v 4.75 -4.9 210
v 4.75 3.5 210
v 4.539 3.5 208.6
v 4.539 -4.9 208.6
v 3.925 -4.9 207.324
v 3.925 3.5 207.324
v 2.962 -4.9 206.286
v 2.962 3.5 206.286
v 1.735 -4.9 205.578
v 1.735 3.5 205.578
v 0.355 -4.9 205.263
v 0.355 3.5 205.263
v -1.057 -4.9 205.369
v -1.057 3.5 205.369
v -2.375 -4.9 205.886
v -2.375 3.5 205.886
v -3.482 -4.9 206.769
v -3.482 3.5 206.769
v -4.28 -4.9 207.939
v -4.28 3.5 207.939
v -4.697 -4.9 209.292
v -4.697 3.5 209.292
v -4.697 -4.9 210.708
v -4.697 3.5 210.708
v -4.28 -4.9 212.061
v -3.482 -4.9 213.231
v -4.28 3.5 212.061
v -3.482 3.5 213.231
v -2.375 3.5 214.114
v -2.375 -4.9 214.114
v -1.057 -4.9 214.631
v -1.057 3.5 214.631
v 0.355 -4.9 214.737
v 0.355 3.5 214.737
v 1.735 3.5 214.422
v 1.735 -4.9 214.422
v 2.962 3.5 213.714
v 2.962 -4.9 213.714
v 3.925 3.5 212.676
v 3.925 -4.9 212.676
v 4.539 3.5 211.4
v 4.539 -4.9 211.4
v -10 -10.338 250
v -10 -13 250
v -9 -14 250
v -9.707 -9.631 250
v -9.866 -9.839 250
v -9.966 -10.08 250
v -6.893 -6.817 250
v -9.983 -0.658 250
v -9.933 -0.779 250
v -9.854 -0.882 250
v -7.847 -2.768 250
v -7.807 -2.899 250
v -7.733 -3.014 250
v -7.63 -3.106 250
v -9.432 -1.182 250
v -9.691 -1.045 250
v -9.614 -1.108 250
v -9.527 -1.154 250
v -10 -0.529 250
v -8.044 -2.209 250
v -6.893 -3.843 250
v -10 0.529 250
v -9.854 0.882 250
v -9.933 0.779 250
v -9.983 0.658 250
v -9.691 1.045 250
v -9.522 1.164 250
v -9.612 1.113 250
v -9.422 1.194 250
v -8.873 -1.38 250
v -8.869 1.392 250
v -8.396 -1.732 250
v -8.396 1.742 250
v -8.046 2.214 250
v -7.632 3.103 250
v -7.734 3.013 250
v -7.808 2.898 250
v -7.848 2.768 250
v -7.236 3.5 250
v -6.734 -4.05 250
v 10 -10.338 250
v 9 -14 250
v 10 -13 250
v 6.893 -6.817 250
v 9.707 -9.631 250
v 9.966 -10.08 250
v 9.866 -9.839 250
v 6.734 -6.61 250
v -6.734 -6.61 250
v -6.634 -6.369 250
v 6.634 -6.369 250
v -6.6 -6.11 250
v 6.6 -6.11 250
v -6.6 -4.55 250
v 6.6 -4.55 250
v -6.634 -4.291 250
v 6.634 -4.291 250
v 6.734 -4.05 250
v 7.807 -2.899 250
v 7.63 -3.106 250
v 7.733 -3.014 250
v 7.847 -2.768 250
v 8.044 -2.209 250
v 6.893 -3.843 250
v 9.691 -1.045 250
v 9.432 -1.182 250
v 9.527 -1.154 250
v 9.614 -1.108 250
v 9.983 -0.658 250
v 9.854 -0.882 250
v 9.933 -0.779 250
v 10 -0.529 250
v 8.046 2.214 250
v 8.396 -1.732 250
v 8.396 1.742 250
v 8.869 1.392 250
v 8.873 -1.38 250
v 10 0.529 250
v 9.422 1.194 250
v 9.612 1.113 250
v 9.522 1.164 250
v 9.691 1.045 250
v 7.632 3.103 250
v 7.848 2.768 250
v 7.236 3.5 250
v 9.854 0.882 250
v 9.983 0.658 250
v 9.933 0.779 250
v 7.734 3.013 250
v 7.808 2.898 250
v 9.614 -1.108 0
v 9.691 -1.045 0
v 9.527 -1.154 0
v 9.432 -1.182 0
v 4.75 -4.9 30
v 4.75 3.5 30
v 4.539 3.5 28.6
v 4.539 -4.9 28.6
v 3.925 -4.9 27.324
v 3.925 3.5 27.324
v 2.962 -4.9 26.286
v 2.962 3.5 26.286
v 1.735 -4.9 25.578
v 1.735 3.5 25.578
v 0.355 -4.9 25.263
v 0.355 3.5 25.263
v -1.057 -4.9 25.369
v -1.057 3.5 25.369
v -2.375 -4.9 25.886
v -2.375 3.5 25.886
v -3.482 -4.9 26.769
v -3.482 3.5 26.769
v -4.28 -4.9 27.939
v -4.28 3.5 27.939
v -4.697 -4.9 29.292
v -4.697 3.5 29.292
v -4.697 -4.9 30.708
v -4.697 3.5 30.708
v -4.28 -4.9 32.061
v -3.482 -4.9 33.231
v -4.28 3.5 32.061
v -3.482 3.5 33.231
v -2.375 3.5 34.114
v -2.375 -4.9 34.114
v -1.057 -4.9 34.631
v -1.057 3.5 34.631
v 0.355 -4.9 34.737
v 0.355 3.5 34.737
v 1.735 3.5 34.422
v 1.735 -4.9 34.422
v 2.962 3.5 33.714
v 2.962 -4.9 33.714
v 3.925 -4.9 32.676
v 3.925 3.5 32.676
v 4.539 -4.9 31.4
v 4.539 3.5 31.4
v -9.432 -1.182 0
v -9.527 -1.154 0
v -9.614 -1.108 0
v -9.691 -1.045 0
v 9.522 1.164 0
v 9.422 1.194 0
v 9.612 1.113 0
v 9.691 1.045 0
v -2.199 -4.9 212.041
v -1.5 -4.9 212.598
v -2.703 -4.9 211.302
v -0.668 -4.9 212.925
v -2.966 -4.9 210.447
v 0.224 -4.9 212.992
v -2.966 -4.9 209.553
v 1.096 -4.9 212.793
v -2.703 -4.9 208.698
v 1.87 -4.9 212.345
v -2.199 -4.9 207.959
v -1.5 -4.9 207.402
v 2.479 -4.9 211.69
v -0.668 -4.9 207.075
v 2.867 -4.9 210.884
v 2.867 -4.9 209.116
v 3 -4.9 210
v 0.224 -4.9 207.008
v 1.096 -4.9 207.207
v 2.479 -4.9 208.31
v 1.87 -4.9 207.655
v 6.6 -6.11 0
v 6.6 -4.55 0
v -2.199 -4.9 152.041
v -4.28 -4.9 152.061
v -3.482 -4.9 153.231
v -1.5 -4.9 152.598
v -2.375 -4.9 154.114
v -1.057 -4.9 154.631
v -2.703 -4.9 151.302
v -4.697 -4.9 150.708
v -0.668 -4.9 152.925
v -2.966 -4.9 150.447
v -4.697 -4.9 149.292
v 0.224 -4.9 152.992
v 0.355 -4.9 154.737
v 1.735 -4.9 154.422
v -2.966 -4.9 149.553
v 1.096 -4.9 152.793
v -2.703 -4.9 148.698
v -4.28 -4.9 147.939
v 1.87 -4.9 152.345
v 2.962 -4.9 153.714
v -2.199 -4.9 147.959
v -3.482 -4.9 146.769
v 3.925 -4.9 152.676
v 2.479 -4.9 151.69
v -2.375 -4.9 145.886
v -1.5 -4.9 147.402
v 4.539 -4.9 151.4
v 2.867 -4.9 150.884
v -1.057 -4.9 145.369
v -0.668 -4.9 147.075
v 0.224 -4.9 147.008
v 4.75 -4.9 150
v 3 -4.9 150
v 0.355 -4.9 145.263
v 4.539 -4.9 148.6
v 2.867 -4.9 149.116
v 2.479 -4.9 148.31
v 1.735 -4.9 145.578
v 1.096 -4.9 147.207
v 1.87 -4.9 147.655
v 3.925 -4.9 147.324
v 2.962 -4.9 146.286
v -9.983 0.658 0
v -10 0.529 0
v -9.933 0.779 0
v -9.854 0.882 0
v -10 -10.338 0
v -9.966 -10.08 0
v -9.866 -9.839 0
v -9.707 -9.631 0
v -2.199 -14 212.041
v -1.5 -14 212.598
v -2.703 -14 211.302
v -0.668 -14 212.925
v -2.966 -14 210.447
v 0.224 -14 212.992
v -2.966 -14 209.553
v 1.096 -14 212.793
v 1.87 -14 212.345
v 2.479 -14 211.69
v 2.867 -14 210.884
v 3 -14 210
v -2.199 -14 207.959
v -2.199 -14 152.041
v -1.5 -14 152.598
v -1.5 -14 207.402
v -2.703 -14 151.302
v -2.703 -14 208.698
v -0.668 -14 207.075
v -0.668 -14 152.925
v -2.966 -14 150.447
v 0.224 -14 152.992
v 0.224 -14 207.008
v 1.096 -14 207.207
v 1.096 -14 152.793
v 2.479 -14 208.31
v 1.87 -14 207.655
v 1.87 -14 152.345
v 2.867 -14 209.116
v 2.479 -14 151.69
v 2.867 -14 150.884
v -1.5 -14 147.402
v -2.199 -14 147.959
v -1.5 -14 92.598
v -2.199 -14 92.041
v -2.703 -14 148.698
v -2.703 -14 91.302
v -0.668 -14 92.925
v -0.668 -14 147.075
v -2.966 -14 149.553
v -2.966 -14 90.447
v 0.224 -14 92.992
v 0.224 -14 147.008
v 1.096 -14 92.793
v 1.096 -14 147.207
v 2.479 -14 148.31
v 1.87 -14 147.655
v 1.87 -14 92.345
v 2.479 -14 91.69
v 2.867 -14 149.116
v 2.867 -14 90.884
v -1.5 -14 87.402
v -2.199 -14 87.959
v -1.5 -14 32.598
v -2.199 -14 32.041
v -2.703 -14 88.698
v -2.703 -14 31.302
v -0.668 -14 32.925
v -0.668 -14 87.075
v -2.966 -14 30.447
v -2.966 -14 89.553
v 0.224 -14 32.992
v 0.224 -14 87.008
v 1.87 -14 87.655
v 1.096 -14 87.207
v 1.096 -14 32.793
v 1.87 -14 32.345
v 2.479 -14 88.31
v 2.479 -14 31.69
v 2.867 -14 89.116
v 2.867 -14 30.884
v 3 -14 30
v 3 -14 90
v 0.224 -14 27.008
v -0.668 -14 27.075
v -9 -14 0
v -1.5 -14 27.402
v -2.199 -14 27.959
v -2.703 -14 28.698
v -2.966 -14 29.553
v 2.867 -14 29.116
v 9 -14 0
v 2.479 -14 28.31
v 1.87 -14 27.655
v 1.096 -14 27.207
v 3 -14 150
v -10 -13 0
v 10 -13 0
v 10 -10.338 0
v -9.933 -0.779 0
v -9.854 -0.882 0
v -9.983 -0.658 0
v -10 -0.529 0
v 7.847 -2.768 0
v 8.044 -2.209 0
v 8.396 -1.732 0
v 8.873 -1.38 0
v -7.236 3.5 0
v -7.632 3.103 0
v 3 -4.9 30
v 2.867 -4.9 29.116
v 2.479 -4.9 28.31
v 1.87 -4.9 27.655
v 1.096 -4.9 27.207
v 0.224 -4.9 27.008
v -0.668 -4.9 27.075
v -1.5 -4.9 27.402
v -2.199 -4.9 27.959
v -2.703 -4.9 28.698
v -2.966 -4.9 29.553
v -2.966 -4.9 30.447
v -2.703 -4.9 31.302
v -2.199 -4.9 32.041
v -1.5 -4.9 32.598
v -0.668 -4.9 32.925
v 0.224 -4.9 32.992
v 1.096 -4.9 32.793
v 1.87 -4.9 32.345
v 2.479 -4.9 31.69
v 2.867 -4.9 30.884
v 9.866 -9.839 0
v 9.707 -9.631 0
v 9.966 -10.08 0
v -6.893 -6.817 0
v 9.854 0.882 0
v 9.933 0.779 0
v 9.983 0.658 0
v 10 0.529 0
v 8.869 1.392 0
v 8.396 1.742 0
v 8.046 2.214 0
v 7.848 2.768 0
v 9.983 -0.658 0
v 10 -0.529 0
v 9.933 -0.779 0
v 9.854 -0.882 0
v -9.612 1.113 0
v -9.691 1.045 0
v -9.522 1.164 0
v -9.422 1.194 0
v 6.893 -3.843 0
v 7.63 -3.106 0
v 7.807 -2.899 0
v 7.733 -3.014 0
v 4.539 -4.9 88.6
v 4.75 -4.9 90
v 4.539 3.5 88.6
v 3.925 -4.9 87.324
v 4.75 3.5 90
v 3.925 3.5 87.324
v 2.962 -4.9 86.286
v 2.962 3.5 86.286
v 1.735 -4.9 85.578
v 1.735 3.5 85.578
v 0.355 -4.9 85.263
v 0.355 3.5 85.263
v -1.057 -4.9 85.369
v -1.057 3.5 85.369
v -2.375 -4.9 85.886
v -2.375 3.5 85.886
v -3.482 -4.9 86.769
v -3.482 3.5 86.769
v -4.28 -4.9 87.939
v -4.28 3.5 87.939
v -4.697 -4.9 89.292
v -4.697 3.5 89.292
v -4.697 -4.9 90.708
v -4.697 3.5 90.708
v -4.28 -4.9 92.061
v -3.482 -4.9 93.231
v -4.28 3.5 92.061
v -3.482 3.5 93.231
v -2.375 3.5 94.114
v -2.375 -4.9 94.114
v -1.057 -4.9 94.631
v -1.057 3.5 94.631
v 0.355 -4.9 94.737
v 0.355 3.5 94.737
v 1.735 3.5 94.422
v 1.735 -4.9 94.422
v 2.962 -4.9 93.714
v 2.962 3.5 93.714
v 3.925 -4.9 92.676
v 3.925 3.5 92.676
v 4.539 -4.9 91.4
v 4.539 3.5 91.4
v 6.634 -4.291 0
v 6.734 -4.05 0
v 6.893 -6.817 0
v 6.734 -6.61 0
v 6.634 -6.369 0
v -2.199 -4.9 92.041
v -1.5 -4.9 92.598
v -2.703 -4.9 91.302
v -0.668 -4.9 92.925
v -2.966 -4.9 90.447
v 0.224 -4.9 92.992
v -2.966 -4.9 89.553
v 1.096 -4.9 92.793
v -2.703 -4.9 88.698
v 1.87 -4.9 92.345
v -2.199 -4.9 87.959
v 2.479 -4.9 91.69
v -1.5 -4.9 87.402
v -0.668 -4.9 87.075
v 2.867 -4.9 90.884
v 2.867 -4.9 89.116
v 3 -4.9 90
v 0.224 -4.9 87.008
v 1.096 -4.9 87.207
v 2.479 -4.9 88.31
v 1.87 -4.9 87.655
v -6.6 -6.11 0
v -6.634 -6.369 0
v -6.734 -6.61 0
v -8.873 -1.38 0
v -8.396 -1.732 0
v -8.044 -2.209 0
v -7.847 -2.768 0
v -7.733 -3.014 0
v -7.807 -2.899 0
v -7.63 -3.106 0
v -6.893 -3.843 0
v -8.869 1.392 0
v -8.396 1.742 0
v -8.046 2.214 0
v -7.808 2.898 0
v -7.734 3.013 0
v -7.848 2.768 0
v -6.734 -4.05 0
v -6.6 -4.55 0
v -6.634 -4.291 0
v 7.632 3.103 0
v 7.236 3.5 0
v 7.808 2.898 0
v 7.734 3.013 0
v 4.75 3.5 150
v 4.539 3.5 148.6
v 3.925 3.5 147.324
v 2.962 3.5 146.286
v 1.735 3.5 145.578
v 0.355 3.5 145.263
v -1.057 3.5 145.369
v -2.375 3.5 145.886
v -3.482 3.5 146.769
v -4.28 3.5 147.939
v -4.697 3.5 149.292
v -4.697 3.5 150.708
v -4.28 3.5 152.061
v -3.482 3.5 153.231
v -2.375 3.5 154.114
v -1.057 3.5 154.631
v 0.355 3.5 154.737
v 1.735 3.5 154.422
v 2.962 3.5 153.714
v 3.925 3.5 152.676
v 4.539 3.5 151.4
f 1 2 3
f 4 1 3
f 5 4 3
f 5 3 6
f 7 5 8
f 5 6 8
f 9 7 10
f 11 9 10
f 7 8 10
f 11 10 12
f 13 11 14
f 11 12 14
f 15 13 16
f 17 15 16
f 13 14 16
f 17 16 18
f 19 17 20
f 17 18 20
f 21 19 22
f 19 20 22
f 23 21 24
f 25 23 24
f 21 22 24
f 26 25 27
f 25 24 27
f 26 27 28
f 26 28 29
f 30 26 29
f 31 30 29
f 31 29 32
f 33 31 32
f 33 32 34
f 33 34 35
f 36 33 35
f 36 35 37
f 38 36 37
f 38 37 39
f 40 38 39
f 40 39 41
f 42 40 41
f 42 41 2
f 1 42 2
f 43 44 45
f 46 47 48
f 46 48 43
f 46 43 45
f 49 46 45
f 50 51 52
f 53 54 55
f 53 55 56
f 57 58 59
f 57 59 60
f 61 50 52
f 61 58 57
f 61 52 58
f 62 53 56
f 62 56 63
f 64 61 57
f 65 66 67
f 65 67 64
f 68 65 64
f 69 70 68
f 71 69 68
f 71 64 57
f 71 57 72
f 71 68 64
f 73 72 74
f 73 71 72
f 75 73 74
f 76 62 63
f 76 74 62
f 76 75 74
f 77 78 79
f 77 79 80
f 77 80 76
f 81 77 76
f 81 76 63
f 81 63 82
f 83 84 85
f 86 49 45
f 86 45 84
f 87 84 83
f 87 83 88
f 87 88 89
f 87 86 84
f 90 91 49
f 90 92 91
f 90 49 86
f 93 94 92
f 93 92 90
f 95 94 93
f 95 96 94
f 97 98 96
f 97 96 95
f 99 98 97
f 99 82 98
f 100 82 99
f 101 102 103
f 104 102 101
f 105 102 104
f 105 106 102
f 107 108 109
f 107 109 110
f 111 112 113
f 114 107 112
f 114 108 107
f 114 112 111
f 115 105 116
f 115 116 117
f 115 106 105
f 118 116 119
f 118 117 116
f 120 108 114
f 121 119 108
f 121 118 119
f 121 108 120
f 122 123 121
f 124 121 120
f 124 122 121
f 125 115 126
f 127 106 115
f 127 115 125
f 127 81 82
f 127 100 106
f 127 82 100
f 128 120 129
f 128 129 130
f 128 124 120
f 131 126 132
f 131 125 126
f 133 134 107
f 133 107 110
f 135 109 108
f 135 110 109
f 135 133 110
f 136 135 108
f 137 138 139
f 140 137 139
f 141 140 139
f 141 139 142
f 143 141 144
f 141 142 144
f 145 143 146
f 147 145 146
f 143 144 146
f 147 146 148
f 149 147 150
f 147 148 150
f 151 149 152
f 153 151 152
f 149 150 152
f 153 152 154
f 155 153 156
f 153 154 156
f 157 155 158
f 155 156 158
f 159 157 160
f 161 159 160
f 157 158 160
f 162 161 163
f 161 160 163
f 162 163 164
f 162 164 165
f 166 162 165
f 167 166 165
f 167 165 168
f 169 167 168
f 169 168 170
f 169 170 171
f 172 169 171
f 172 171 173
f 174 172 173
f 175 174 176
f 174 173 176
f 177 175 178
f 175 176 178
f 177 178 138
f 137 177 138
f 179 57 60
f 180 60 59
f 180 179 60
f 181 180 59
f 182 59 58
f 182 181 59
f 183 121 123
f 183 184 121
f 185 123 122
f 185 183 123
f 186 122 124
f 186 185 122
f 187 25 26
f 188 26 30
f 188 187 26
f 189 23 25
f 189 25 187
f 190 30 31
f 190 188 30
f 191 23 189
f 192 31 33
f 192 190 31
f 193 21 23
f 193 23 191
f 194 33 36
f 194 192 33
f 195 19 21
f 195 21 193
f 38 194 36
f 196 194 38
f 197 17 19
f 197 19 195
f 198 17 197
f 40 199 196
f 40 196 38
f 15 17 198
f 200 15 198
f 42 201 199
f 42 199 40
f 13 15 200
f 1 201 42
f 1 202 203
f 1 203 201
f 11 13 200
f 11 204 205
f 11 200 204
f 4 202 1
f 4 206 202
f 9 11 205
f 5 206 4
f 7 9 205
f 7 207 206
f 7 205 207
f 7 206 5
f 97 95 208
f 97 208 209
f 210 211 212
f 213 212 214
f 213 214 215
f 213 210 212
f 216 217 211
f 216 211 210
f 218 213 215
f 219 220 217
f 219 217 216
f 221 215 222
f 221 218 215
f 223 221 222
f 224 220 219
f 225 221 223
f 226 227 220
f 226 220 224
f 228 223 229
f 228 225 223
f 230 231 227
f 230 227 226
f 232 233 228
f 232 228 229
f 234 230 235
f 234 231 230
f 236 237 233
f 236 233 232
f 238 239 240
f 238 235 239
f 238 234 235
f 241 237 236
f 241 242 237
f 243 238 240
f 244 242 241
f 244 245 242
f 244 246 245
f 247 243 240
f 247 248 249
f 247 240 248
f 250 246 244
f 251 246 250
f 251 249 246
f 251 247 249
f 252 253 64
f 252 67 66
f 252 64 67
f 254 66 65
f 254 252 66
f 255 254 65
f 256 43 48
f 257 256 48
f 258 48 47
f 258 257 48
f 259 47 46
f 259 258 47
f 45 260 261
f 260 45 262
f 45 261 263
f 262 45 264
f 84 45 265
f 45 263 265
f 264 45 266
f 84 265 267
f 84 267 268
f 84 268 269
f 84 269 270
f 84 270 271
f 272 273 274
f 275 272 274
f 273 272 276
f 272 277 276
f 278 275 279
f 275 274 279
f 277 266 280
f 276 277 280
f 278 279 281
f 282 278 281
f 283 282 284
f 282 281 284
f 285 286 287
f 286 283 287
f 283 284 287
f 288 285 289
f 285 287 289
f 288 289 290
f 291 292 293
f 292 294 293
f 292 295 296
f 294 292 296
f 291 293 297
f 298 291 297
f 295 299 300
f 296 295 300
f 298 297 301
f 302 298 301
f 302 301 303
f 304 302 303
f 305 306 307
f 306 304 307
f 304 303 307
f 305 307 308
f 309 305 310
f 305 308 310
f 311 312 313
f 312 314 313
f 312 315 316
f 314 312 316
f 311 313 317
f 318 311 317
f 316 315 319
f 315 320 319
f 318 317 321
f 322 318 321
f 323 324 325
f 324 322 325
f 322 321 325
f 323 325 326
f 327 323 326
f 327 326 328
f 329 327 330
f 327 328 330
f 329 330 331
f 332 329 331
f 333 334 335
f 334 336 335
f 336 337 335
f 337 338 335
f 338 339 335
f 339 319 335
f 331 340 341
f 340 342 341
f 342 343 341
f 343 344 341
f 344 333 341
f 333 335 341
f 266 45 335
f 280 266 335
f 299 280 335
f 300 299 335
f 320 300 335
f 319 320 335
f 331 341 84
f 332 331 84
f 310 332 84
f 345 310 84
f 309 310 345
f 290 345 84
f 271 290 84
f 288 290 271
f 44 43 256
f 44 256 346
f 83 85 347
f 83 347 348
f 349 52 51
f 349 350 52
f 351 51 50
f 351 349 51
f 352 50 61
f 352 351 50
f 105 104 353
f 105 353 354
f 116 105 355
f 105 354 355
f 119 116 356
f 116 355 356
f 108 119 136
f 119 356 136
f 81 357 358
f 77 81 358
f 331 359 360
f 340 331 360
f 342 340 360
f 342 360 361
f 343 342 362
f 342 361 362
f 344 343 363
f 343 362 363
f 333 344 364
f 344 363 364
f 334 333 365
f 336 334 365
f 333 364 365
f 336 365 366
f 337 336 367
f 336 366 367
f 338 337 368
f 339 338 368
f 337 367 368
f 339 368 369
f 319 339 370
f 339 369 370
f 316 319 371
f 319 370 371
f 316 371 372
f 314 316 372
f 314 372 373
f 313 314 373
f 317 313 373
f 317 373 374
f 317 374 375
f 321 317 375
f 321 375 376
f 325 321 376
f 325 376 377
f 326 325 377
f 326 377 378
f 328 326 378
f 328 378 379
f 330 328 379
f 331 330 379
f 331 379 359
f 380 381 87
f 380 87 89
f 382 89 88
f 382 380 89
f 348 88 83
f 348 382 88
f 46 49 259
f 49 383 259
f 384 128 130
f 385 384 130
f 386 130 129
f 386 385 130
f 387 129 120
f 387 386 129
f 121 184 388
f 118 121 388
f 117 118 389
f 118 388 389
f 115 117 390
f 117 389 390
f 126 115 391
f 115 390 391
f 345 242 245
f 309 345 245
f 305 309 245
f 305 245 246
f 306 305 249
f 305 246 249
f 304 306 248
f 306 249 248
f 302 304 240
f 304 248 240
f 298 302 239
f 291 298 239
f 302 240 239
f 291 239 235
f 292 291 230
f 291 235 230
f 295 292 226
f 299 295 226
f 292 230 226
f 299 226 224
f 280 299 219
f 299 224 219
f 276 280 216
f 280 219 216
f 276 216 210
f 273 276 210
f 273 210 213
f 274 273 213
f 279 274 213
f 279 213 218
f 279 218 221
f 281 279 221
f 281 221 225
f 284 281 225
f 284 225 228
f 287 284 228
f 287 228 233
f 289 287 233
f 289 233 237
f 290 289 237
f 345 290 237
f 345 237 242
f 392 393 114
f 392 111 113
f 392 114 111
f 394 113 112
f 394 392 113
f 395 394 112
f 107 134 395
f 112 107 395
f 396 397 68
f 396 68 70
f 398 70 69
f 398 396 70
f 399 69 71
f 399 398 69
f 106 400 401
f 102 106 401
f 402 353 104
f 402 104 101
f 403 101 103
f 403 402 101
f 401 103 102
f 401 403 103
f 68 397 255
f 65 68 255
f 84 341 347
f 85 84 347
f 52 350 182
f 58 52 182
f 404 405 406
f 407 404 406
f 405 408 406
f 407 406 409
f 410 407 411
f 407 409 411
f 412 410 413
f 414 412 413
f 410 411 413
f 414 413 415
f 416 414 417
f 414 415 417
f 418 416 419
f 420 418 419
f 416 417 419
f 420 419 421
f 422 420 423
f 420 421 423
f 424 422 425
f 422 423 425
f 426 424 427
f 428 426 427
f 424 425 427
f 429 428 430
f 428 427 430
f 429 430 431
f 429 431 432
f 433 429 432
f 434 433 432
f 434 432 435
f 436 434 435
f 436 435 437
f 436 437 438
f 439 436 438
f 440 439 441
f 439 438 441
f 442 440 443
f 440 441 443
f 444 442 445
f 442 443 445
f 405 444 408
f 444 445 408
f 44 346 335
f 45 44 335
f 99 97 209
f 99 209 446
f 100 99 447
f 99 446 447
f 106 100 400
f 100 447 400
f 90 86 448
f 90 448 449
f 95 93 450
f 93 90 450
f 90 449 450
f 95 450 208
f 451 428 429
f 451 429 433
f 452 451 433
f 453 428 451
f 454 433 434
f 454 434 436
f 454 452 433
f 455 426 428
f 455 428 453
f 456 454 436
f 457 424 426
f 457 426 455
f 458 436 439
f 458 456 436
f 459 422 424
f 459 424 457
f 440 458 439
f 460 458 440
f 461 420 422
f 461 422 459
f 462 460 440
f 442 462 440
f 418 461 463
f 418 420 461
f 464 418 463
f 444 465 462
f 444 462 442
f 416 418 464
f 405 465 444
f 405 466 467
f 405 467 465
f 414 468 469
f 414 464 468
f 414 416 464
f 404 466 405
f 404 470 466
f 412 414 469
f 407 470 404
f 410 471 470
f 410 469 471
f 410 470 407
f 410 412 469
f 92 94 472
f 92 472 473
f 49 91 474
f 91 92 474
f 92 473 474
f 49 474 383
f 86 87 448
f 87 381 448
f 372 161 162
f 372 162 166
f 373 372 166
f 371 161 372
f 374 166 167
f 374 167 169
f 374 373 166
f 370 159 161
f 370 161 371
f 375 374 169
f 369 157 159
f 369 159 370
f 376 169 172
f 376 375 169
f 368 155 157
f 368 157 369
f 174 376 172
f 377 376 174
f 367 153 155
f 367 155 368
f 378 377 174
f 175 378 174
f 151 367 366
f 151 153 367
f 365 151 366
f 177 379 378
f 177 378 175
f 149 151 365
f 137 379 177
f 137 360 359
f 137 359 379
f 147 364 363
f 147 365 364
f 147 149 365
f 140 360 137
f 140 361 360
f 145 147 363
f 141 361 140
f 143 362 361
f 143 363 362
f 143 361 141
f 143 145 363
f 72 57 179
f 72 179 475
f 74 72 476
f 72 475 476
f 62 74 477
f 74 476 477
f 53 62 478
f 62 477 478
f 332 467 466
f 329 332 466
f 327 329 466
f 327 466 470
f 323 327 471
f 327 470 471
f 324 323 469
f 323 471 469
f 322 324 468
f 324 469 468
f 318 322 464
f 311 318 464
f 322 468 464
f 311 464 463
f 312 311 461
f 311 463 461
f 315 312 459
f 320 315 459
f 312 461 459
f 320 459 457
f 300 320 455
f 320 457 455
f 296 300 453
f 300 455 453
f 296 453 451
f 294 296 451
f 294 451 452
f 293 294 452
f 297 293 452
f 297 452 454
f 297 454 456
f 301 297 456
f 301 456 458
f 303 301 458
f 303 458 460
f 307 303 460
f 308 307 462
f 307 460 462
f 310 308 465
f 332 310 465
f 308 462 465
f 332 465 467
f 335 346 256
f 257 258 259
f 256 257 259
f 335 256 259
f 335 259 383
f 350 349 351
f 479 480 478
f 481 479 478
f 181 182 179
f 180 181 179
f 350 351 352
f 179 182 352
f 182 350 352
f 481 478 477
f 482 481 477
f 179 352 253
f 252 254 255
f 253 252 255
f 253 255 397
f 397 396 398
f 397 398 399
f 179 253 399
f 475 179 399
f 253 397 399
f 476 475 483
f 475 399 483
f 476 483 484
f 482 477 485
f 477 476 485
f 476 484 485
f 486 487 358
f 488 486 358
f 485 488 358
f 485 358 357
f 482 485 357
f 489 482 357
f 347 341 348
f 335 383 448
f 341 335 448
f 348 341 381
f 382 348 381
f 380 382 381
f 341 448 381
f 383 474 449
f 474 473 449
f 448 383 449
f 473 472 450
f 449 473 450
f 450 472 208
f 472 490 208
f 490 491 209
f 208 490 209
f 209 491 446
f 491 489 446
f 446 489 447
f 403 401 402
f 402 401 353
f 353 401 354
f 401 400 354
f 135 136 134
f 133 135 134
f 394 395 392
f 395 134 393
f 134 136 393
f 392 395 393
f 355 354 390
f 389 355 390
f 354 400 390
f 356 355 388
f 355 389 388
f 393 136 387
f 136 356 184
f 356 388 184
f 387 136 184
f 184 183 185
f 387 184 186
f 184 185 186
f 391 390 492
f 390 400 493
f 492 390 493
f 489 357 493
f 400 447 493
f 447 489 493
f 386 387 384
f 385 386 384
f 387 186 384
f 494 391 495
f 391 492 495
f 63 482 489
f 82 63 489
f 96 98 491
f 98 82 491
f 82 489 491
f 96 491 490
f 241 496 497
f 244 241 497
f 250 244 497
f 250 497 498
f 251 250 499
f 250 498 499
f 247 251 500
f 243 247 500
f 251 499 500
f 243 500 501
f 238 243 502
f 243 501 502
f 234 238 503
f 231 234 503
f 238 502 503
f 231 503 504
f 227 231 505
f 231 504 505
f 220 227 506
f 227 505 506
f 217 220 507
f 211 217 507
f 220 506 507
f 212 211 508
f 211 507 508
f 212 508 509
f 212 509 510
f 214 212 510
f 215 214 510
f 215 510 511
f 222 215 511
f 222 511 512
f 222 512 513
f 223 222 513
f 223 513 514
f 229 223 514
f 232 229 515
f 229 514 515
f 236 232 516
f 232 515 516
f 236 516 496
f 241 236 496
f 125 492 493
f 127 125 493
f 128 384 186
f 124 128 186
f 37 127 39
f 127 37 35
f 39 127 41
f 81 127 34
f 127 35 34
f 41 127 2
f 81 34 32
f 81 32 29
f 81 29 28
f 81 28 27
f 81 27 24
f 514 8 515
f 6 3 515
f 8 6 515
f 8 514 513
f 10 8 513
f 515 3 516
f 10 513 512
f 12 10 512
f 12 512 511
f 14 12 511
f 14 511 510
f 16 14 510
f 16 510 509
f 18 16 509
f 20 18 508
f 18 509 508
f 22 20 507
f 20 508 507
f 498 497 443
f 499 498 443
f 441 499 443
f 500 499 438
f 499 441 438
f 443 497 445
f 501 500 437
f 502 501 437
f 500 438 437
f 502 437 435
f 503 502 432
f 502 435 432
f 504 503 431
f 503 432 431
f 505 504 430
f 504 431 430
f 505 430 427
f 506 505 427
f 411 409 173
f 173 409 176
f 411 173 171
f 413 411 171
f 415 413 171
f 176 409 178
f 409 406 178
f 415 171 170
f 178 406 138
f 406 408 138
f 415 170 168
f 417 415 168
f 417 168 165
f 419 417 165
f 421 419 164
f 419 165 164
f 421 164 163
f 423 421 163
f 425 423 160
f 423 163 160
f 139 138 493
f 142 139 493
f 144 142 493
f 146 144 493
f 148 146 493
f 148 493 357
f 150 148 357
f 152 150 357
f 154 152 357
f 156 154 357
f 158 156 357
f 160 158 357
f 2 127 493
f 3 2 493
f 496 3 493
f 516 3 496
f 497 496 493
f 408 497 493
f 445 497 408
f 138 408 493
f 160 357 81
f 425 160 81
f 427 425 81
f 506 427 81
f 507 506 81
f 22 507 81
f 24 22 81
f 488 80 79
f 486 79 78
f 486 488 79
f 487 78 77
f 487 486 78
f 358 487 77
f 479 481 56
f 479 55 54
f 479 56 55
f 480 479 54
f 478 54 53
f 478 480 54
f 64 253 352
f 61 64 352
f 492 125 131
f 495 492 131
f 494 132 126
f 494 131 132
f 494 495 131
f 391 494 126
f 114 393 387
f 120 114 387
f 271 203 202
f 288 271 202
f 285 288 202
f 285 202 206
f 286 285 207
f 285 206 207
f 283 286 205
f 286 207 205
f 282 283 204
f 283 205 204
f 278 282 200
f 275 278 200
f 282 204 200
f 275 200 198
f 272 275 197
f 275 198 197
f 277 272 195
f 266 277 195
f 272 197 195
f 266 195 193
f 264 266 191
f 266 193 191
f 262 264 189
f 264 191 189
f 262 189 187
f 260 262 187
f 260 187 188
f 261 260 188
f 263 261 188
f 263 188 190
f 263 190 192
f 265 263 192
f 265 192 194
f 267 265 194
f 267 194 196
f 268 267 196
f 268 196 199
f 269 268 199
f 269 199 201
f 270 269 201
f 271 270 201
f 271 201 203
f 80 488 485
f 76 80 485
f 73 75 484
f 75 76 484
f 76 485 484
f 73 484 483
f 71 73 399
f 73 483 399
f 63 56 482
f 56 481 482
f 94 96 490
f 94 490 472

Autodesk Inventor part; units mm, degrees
ref_plane "YZ Plane" through (0, 0, 0) normal (1, 0, 0) x (0, 1, 0)
ref_plane "XZ Plane" through (0, 0, 0) normal (0, 1, 0) x (-1, 0, 0)
ref_plane "XY Plane" through (0, 0, 0) normal (0, 0, 1) x (1, 0, 0)
sketch "Sketch1" plane through (0, 0, 0) normal (0, 0, 1) x (1, 0, 0)
  arc A0 (-9.7071, -9.6314) -> (-10, -10.3385) centre (-9, -10.3385) ccw
  line L0 (-10, -10.3385) -> (-10, -13)
  line L1 (-10, -13) -> (-9, -14)
  line L2 (-9, -14) -> (9, -14)
  line L3 (9, -14) -> (10, -13)
  line L4 (10, -13) -> (10, -10.3385)
  arc A1 (10, -10.3385) -> (9.7071, -9.6314) centre (9, -10.3385) ccw
  line L5 (9.7071, -9.6314) -> (6.8929, -6.8172)
  arc A2 (6.6, -6.1101) -> (6.8929, -6.8172) centre (7.6, -6.1101) ccw
  line L6 (6.6, -6.1101) -> (6.6, -4.5499)
  arc A3 (6.8929, -3.8428) -> (6.6, -4.5499) centre (7.6, -4.5499) ccw
  line L7 (6.8929, -3.8428) -> (7.6302, -3.1056)
  arc A4 (7.6302, -3.1056) -> (7.8468, -2.7675) centre (7.3529, -2.6895) ccw
  arc A5 (9.4318, -1.1825) -> (7.8468, -2.7675) centre (9.8106, -3.1463) ccw
  arc A6 (9.4318, -1.1825) -> (9.6906, -1.0451) centre (9.3371, -0.6915) ccw
  line L8 (9.6906, -1.0451) -> (9.8536, -0.8822)
  arc A7 (9.8536, -0.8822) -> (10, -0.5286) centre (9.5, -0.5286) ccw
  line L9 (10, -0.5286) -> (10, 0.5286)
  arc A8 (10, 0.5286) -> (9.8536, 0.8822) centre (9.5, 0.5286) ccw
  line L10 (9.8536, 0.8822) -> (9.6906, 1.0451)
  arc A9 (9.6906, 1.0451) -> (9.4224, 1.1941) centre (9.3254, 0.7036) ccw
  arc A10 (7.8482, 2.768) -> (9.4224, 1.1941) centre (9.8101, 3.1561) ccw
  arc A11 (7.8482, 2.768) -> (7.6325, 3.1032) centre (7.3547, 2.6875) ccw
  line L11 (7.6325, 3.1032) -> (7.2357, 3.5)
  line L12 (7.2357, 3.5) -> (-7.2357, 3.5)
  line L13 (-7.2357, 3.5) -> (-7.6325, 3.1032)
  arc A12 (-7.6325, 3.1032) -> (-7.8482, 2.768) centre (-7.3547, 2.6875) ccw
  arc A13 (-9.4224, 1.1941) -> (-7.8482, 2.768) centre (-9.8101, 3.1561) ccw
  arc A14 (-9.4224, 1.1941) -> (-9.6906, 1.0451) centre (-9.3254, 0.7036) ccw
  line L14 (-9.6906, 1.0451) -> (-9.8536, 0.8822)
  arc A15 (-9.8536, 0.8822) -> (-10, 0.5286) centre (-9.5, 0.5286) ccw
  line L15 (-10, 0.5286) -> (-10, -0.5286)
  arc A16 (-10, -0.5286) -> (-9.8536, -0.8822) centre (-9.5, -0.5286) ccw
  line L16 (-9.8536, -0.8822) -> (-9.6906, -1.0451)
  arc A17 (-9.6906, -1.0451) -> (-9.4318, -1.1825) centre (-9.3371, -0.6915) ccw
  arc A18 (-7.8468, -2.7675) -> (-9.4318, -1.1825) centre (-9.8106, -3.1463) ccw
  arc A19 (-7.8468, -2.7675) -> (-7.6302, -3.1056) centre (-7.3529, -2.6895) ccw
  line L17 (-7.6302, -3.1056) -> (-6.8929, -3.8428)
  arc A20 (-6.6, -4.5499) -> (-6.8929, -3.8428) centre (-7.6, -4.5499) ccw
  line L18 (-6.6, -4.5499) -> (-6.6, -6.1101)
  arc A21 (-6.8929, -6.8172) -> (-6.6, -6.1101) centre (-7.6, -6.1101) ccw
  line L19 (-6.8929, -6.8172) -> (-9.7071, -9.6314)
  point P0 (0, 0)
  point P1 (0, 0)
  dimension "d82" = 18
  dimension "d83" = 14.4714
extrude "Extrusion1" add sketch "Sketch1" along normal blind 250
sketch "Sketch2" plane through (-7.2357, 3.5, 250) normal (0, 1, 0) x (1, 0, 0)
  line L0 (14.4714, 250) -> (0, 250) projected
  line L1 (0, 250) -> (0, 0) projected
  line L2 (14.4714, 0) -> (0, 0) projected
  line L3 (14.4714, 250) -> (14.4714, 0) projected
  circle A0 centre (7.2357, 1480) radius 4.75
  circle A1 centre (7.2357, 1480) radius 3
  circle A2 centre (7.2357, 1420) radius 4.75
  circle A3 centre (7.2357, 1420) radius 3
  circle A4 centre (7.2357, 1360) radius 4.75
  circle A5 centre (7.2357, 1360) radius 3
  circle A6 centre (7.2357, 1300) radius 4.75
  circle A7 centre (7.2357, 1300) radius 3
  circle A8 centre (7.2357, 1240) radius 4.75
  circle A9 centre (7.2357, 1240) radius 3
  circle A10 centre (7.2357, 1180) radius 4.75
  circle A11 centre (7.2357, 1180) radius 3
  circle A12 centre (7.2357, 1120) radius 4.75
  circle A13 centre (7.2357, 1120) radius 3
  circle A14 centre (7.2357, 1060) radius 4.75
  circle A15 centre (7.2357, 1060) radius 3
  circle A16 centre (7.2357, 1000) radius 4.75
  circle A17 centre (7.2357, 1000) radius 3
  circle A18 centre (7.2357, 940) radius 4.75
  circle A19 centre (7.2357, 940) radius 3
  circle A20 centre (7.2357, 880) radius 4.75
  circle A21 centre (7.2357, 880) radius 3
  circle A22 centre (7.2357, 820) radius 4.75
  circle A23 centre (7.2357, 820) radius 3
  circle A24 centre (7.2357, 760) radius 4.75
  circle A25 centre (7.2357, 760) radius 3
  circle A26 centre (7.2357, 700) radius 4.75
  circle A27 centre (7.2357, 700) radius 3
  circle A28 centre (7.2357, 640) radius 4.75
  circle A29 centre (7.2357, 640) radius 3
  circle A30 centre (7.2357, 580) radius 4.75
  circle A31 centre (7.2357, 580) radius 3
  circle A32 centre (7.2357, 520) radius 4.75
  circle A33 centre (7.2357, 520) radius 3
  circle A34 centre (7.2357, 460) radius 4.75
  circle A35 centre (7.2357, 460) radius 3
  circle A36 centre (7.2357, 400) radius 4.75
  circle A37 centre (7.2357, 400) radius 3
  circle A38 centre (7.2357, 340) radius 4.75
  circle A39 centre (7.2357, 340) radius 3
  circle A40 centre (7.2357, 280) radius 4.75
  circle A41 centre (7.2357, 280) radius 3
  circle A42 centre (7.2357, 220) radius 4.75
  circle A43 centre (7.2357, 220) radius 3
  circle A44 centre (7.2357, 160) radius 4.75
  circle A45 centre (7.2357, 160) radius 3
  circle A46 centre (7.2357, 100) radius 4.75
  circle A47 centre (7.2357, 100) radius 3
  circle A48 centre (7.2357, 40) radius 4.75
  circle A49 centre (7.2357, 40) radius 3
  point P0 (7.2357, 250)
  dimension "d3" = 9.5
  dimension "d4" = 6
  dimension "d6" = 9.5
  dimension "d7" = 6
  dimension "d9" = 9.5
  dimension "d10" = 6
  dimension "d12" = 9.5
  dimension "d13" = 6
  dimension "d15" = 9.5
  dimension "d16" = 6
  dimension "d18" = 9.5
  dimension "d19" = 6
  dimension "d21" = 9.5
  dimension "d22" = 6
  dimension "d24" = 9.5
  dimension "d25" = 6
  dimension "d27" = 9.5
  dimension "d28" = 6
  dimension "d30" = 9.5
  dimension "d31" = 6
  dimension "d33" = 9.5
  dimension "d34" = 6
  dimension "d36" = 9.5
  dimension "d37" = 6
  dimension "d39" = 9.5
  dimension "d40" = 6
  dimension "d42" = 9.5
  dimension "d43" = 6
  dimension "d45" = 9.5
  dimension "d46" = 6
  dimension "d48" = 9.5
  dimension "d49" = 6
  dimension "d51" = 9.5
  dimension "d52" = 6
  dimension "d54" = 9.5
  dimension "d55" = 6
  dimension "d57" = 9.5
  dimension "d58" = 6
  dimension "d60" = 9.5
  dimension "d61" = 6
  dimension "d63" = 9.5
  dimension "d64" = 6
  dimension "d66" = 9.5
  dimension "d67" = 6
  dimension "d69" = 9.5
  dimension "d70" = 6
  dimension "d72" = 9.5
  dimension "d73" = 6
  dimension "d75" = 9.5
  dimension "d76" = 6
extrude "Extrusion2" cut sketch "Sketch2" against normal blind 30 contours A1 | A3 | A5 | A7 | A9 | A11 | A13 | A15 | A17 | A19 | A21 | A23 | A25 | A27 | A29 | A31 | A35 | A37 | A39 | A41 | A43 | A45 | A47 | A49
extrude "Extrusion3" cut sketch "Sketch2" against normal blind 8.4 contours A0 | A2 | A4 | A6 | A8 | A10 | A11 | A12 | A14 | A16 | A18 | A20 | A24 | A26 | A28 | A30 | A32 | A34 | A36 | A38 | A40 | A42 | A44 | A46 | A48
sketch "Sketch3" plane through (0, 0, 250) normal (0, 0, 1) x (1, 0, 0)
  line L0 (9.6906, -1.0451) -> (9.8536, -0.8822) projected
  arc A0 (9.8536, -0.8822) -> (10, -0.5286) centre (9.5, -0.5286) ccw projected
  line L1 (10, -0.5286) -> (10, 0.5286) projected
  arc A1 (10, 0.5286) -> (9.8536, 0.8822) centre (9.5, 0.5286) ccw projected
  line L2 (9.8536, 0.8822) -> (9.6906, 1.0451) projected
  arc A2 (9.6906, 1.0451) -> (9.4224, 1.1941) centre (9.3254, 0.7036) ccw projected
  arc A3 (7.8482, 2.768) -> (9.4224, 1.1941) centre (9.8101, 3.1561) ccw projected
  arc A4 (7.8482, 2.768) -> (7.6325, 3.1032) centre (7.3547, 2.6875) ccw projected
  line L3 (7.6325, 3.1032) -> (7.2357, 3.5) projected
  line L4 (7.2357, 3.5) -> (-7.2357, 3.5) projected
  line L5 (-7.2357, 3.5) -> (-7.6325, 3.1032) projected
  arc A5 (-7.6325, 3.1032) -> (-7.8482, 2.768) centre (-7.3547, 2.6875) ccw projected
  arc A6 (-9.4224, 1.1941) -> (-7.8482, 2.768) centre (-9.8101, 3.1561) ccw projected
  arc A7 (-9.4224, 1.1941) -> (-9.6906, 1.0451) centre (-9.3254, 0.7036) ccw projected
  line L6 (-9.6906, 1.0451) -> (-9.8536, 0.8822) projected
  arc A8 (-9.8536, 0.8822) -> (-10, 0.5286) centre (-9.5, 0.5286) ccw projected
  line L7 (-10, 0.5286) -> (-10, -0.5286) projected
  arc A9 (-10, -0.5286) -> (-9.8536, -0.8822) centre (-9.5, -0.5286) ccw projected
  line L8 (-9.8536, -0.8822) -> (-9.6906, -1.0451) projected
  arc A10 (-9.6906, -1.0451) -> (-9.4318, -1.1825) centre (-9.3371, -0.6915) ccw projected
  arc A11 (-7.8468, -2.7675) -> (-9.4318, -1.1825) centre (-9.8106, -3.1463) ccw projected
  arc A12 (-7.8468, -2.7675) -> (-7.6302, -3.1056) centre (-7.3529, -2.6895) ccw projected
  line L9 (-7.6302, -3.1056) -> (-6.8929, -3.8428) projected
  arc A13 (-6.6, -4.5499) -> (-6.8929, -3.8428) centre (-7.6, -4.5499) ccw projected
  line L10 (-6.6, -4.5499) -> (-6.6, -6.1101) projected
  arc A14 (-6.8929, -6.8172) -> (-6.6, -6.1101) centre (-7.6, -6.1101) ccw projected
  line L11 (-6.8929, -6.8172) -> (-9.7071, -9.6314) projected
  arc A15 (-9.7071, -9.6314) -> (-10, -10.3385) centre (-9, -10.3385) ccw projected
  line L12 (-10, -10.3385) -> (-10, -13) projected
  line L13 (-10, -13) -> (-9, -14) projected
  line L14 (-9, -14) -> (9, -14) projected
  line L15 (9, -14) -> (10, -13) projected
  line L16 (10, -13) -> (10, -10.3385) projected
  arc A16 (10, -10.3385) -> (9.7071, -9.6314) centre (9, -10.3385) ccw projected
  line L17 (9.7071, -9.6314) -> (6.8929, -6.8172) projected
  arc A17 (6.6, -6.1101) -> (6.8929, -6.8172) centre (7.6, -6.1101) ccw projected
  line L18 (6.6, -6.1101) -> (6.6, -4.5499) projected
  arc A18 (6.8929, -3.8428) -> (6.6, -4.5499) centre (7.6, -4.5499) ccw projected
  line L19 (6.8929, -3.8428) -> (7.6302, -3.1056) projected
  arc A19 (7.6302, -3.1056) -> (7.8468, -2.7675) centre (7.3529, -2.6895) ccw projected
  arc A20 (9.4318, -1.1825) -> (7.8468, -2.7675) centre (9.8106, -3.1463) ccw projected
  arc A21 (9.4318, -1.1825) -> (9.6906, -1.0451) centre (9.3371, -0.6915) ccw projected
  line L20 (-4.75, 3.5) -> (4.75, 3.5) projected
  line L21 (0, 3.5) -> (0, -14)
  point P0 (0, 0)
sketch "Sketch4" plane through (0, 0, 0) normal (0, 0, -1) x (-1, 0, 0)
  line L0 (-9.6906, -1.0451) -> (-9.8536, -0.8822) projected
  arc A0 (-9.6906, -1.0451) -> (-9.4318, -1.1825) centre (-9.3371, -0.6915) ccw projected
  arc A1 (-9.4318, -1.1825) -> (-7.8468, -2.7675) centre (-9.8106, -3.1463) ccw projected
  arc A2 (-7.8468, -2.7675) -> (-7.6302, -3.1056) centre (-7.3529, -2.6895) ccw projected
  line L1 (-6.8929, -3.8428) -> (-7.6302, -3.1056) projected
  arc A3 (-6.8929, -3.8428) -> (-6.6, -4.5499) centre (-7.6, -4.5499) ccw projected
  line L2 (-6.6, -6.1101) -> (-6.6, -4.5499) projected
  arc A4 (-6.6, -6.1101) -> (-6.8929, -6.8172) centre (-7.6, -6.1101) ccw projected
  line L3 (-9.7071, -9.6314) -> (-6.8929, -6.8172) projected
  arc A5 (-9.7071, -9.6314) -> (-10, -10.3385) centre (-9, -10.3385) ccw projected
  line L4 (-10, -13) -> (-10, -10.3385) projected
  line L5 (-9, -14) -> (-10, -13) projected
  line L6 (9, -14) -> (-9, -14) projected
  line L7 (10, -13) -> (9, -14) projected
  line L8 (10, -10.3385) -> (10, -13) projected
  arc A6 (10, -10.3385) -> (9.7071, -9.6314) centre (9, -10.3385) ccw projected
  line L9 (6.8929, -6.8172) -> (9.7071, -9.6314) projected
  arc A7 (6.8929, -6.8172) -> (6.6, -6.1101) centre (7.6, -6.1101) ccw projected
  line L10 (6.6, -4.5499) -> (6.6, -6.1101) projected
  arc A8 (6.6, -4.5499) -> (6.8929, -3.8428) centre (7.6, -4.5499) ccw projected
  line L11 (7.6302, -3.1056) -> (6.8929, -3.8428) projected
  arc A9 (7.6302, -3.1056) -> (7.8468, -2.7675) centre (7.3529, -2.6895) ccw projected
  arc A10 (7.8468, -2.7675) -> (9.4318, -1.1825) centre (9.8106, -3.1463) ccw projected
  arc A11 (9.4318, -1.1825) -> (9.6906, -1.0451) centre (9.3371, -0.6915) ccw projected
  line L12 (9.8536, -0.8822) -> (9.6906, -1.0451) projected
  arc A12 (9.8536, -0.8822) -> (10, -0.5286) centre (9.5, -0.5286) ccw projected
  line L13 (10, 0.5286) -> (10, -0.5286) projected
  arc A13 (10, 0.5286) -> (9.8536, 0.8822) centre (9.5, 0.5286) ccw projected
  line L14 (9.6906, 1.0451) -> (9.8536, 0.8822) projected
  arc A14 (9.6906, 1.0451) -> (9.4224, 1.1941) centre (9.3254, 0.7036) ccw projected
  arc A15 (9.4224, 1.1941) -> (7.8482, 2.768) centre (9.8101, 3.1561) ccw projected
  arc A16 (7.8482, 2.768) -> (7.6325, 3.1032) centre (7.3547, 2.6875) ccw projected
  line L15 (7.2357, 3.5) -> (7.6325, 3.1032) projected
  line L16 (-7.2357, 3.5) -> (7.2357, 3.5) projected
  line L17 (-7.6325, 3.1032) -> (-7.2357, 3.5) projected
  arc A17 (-7.6325, 3.1032) -> (-7.8482, 2.768) centre (-7.3547, 2.6875) ccw projected
  arc A18 (-7.8482, 2.768) -> (-9.4224, 1.1941) centre (-9.8101, 3.1561) ccw projected
  arc A19 (-9.4224, 1.1941) -> (-9.6906, 1.0451) centre (-9.3254, 0.7036) ccw projected
  line L18 (-9.8536, 0.8822) -> (-9.6906, 1.0451) projected
  arc A20 (-9.8536, 0.8822) -> (-10, 0.5286) centre (-9.5, 0.5286) ccw projected
  line L19 (-10, -0.5286) -> (-10, 0.5286) projected
  arc A21 (-10, -0.5286) -> (-9.8536, -0.8822) centre (-9.5, -0.5286) ccw projected
  line L20 (0, 3.5) -> (0, -14)
  point P0 (0, 0)
properties part number "Thanh_truot_20x200"
